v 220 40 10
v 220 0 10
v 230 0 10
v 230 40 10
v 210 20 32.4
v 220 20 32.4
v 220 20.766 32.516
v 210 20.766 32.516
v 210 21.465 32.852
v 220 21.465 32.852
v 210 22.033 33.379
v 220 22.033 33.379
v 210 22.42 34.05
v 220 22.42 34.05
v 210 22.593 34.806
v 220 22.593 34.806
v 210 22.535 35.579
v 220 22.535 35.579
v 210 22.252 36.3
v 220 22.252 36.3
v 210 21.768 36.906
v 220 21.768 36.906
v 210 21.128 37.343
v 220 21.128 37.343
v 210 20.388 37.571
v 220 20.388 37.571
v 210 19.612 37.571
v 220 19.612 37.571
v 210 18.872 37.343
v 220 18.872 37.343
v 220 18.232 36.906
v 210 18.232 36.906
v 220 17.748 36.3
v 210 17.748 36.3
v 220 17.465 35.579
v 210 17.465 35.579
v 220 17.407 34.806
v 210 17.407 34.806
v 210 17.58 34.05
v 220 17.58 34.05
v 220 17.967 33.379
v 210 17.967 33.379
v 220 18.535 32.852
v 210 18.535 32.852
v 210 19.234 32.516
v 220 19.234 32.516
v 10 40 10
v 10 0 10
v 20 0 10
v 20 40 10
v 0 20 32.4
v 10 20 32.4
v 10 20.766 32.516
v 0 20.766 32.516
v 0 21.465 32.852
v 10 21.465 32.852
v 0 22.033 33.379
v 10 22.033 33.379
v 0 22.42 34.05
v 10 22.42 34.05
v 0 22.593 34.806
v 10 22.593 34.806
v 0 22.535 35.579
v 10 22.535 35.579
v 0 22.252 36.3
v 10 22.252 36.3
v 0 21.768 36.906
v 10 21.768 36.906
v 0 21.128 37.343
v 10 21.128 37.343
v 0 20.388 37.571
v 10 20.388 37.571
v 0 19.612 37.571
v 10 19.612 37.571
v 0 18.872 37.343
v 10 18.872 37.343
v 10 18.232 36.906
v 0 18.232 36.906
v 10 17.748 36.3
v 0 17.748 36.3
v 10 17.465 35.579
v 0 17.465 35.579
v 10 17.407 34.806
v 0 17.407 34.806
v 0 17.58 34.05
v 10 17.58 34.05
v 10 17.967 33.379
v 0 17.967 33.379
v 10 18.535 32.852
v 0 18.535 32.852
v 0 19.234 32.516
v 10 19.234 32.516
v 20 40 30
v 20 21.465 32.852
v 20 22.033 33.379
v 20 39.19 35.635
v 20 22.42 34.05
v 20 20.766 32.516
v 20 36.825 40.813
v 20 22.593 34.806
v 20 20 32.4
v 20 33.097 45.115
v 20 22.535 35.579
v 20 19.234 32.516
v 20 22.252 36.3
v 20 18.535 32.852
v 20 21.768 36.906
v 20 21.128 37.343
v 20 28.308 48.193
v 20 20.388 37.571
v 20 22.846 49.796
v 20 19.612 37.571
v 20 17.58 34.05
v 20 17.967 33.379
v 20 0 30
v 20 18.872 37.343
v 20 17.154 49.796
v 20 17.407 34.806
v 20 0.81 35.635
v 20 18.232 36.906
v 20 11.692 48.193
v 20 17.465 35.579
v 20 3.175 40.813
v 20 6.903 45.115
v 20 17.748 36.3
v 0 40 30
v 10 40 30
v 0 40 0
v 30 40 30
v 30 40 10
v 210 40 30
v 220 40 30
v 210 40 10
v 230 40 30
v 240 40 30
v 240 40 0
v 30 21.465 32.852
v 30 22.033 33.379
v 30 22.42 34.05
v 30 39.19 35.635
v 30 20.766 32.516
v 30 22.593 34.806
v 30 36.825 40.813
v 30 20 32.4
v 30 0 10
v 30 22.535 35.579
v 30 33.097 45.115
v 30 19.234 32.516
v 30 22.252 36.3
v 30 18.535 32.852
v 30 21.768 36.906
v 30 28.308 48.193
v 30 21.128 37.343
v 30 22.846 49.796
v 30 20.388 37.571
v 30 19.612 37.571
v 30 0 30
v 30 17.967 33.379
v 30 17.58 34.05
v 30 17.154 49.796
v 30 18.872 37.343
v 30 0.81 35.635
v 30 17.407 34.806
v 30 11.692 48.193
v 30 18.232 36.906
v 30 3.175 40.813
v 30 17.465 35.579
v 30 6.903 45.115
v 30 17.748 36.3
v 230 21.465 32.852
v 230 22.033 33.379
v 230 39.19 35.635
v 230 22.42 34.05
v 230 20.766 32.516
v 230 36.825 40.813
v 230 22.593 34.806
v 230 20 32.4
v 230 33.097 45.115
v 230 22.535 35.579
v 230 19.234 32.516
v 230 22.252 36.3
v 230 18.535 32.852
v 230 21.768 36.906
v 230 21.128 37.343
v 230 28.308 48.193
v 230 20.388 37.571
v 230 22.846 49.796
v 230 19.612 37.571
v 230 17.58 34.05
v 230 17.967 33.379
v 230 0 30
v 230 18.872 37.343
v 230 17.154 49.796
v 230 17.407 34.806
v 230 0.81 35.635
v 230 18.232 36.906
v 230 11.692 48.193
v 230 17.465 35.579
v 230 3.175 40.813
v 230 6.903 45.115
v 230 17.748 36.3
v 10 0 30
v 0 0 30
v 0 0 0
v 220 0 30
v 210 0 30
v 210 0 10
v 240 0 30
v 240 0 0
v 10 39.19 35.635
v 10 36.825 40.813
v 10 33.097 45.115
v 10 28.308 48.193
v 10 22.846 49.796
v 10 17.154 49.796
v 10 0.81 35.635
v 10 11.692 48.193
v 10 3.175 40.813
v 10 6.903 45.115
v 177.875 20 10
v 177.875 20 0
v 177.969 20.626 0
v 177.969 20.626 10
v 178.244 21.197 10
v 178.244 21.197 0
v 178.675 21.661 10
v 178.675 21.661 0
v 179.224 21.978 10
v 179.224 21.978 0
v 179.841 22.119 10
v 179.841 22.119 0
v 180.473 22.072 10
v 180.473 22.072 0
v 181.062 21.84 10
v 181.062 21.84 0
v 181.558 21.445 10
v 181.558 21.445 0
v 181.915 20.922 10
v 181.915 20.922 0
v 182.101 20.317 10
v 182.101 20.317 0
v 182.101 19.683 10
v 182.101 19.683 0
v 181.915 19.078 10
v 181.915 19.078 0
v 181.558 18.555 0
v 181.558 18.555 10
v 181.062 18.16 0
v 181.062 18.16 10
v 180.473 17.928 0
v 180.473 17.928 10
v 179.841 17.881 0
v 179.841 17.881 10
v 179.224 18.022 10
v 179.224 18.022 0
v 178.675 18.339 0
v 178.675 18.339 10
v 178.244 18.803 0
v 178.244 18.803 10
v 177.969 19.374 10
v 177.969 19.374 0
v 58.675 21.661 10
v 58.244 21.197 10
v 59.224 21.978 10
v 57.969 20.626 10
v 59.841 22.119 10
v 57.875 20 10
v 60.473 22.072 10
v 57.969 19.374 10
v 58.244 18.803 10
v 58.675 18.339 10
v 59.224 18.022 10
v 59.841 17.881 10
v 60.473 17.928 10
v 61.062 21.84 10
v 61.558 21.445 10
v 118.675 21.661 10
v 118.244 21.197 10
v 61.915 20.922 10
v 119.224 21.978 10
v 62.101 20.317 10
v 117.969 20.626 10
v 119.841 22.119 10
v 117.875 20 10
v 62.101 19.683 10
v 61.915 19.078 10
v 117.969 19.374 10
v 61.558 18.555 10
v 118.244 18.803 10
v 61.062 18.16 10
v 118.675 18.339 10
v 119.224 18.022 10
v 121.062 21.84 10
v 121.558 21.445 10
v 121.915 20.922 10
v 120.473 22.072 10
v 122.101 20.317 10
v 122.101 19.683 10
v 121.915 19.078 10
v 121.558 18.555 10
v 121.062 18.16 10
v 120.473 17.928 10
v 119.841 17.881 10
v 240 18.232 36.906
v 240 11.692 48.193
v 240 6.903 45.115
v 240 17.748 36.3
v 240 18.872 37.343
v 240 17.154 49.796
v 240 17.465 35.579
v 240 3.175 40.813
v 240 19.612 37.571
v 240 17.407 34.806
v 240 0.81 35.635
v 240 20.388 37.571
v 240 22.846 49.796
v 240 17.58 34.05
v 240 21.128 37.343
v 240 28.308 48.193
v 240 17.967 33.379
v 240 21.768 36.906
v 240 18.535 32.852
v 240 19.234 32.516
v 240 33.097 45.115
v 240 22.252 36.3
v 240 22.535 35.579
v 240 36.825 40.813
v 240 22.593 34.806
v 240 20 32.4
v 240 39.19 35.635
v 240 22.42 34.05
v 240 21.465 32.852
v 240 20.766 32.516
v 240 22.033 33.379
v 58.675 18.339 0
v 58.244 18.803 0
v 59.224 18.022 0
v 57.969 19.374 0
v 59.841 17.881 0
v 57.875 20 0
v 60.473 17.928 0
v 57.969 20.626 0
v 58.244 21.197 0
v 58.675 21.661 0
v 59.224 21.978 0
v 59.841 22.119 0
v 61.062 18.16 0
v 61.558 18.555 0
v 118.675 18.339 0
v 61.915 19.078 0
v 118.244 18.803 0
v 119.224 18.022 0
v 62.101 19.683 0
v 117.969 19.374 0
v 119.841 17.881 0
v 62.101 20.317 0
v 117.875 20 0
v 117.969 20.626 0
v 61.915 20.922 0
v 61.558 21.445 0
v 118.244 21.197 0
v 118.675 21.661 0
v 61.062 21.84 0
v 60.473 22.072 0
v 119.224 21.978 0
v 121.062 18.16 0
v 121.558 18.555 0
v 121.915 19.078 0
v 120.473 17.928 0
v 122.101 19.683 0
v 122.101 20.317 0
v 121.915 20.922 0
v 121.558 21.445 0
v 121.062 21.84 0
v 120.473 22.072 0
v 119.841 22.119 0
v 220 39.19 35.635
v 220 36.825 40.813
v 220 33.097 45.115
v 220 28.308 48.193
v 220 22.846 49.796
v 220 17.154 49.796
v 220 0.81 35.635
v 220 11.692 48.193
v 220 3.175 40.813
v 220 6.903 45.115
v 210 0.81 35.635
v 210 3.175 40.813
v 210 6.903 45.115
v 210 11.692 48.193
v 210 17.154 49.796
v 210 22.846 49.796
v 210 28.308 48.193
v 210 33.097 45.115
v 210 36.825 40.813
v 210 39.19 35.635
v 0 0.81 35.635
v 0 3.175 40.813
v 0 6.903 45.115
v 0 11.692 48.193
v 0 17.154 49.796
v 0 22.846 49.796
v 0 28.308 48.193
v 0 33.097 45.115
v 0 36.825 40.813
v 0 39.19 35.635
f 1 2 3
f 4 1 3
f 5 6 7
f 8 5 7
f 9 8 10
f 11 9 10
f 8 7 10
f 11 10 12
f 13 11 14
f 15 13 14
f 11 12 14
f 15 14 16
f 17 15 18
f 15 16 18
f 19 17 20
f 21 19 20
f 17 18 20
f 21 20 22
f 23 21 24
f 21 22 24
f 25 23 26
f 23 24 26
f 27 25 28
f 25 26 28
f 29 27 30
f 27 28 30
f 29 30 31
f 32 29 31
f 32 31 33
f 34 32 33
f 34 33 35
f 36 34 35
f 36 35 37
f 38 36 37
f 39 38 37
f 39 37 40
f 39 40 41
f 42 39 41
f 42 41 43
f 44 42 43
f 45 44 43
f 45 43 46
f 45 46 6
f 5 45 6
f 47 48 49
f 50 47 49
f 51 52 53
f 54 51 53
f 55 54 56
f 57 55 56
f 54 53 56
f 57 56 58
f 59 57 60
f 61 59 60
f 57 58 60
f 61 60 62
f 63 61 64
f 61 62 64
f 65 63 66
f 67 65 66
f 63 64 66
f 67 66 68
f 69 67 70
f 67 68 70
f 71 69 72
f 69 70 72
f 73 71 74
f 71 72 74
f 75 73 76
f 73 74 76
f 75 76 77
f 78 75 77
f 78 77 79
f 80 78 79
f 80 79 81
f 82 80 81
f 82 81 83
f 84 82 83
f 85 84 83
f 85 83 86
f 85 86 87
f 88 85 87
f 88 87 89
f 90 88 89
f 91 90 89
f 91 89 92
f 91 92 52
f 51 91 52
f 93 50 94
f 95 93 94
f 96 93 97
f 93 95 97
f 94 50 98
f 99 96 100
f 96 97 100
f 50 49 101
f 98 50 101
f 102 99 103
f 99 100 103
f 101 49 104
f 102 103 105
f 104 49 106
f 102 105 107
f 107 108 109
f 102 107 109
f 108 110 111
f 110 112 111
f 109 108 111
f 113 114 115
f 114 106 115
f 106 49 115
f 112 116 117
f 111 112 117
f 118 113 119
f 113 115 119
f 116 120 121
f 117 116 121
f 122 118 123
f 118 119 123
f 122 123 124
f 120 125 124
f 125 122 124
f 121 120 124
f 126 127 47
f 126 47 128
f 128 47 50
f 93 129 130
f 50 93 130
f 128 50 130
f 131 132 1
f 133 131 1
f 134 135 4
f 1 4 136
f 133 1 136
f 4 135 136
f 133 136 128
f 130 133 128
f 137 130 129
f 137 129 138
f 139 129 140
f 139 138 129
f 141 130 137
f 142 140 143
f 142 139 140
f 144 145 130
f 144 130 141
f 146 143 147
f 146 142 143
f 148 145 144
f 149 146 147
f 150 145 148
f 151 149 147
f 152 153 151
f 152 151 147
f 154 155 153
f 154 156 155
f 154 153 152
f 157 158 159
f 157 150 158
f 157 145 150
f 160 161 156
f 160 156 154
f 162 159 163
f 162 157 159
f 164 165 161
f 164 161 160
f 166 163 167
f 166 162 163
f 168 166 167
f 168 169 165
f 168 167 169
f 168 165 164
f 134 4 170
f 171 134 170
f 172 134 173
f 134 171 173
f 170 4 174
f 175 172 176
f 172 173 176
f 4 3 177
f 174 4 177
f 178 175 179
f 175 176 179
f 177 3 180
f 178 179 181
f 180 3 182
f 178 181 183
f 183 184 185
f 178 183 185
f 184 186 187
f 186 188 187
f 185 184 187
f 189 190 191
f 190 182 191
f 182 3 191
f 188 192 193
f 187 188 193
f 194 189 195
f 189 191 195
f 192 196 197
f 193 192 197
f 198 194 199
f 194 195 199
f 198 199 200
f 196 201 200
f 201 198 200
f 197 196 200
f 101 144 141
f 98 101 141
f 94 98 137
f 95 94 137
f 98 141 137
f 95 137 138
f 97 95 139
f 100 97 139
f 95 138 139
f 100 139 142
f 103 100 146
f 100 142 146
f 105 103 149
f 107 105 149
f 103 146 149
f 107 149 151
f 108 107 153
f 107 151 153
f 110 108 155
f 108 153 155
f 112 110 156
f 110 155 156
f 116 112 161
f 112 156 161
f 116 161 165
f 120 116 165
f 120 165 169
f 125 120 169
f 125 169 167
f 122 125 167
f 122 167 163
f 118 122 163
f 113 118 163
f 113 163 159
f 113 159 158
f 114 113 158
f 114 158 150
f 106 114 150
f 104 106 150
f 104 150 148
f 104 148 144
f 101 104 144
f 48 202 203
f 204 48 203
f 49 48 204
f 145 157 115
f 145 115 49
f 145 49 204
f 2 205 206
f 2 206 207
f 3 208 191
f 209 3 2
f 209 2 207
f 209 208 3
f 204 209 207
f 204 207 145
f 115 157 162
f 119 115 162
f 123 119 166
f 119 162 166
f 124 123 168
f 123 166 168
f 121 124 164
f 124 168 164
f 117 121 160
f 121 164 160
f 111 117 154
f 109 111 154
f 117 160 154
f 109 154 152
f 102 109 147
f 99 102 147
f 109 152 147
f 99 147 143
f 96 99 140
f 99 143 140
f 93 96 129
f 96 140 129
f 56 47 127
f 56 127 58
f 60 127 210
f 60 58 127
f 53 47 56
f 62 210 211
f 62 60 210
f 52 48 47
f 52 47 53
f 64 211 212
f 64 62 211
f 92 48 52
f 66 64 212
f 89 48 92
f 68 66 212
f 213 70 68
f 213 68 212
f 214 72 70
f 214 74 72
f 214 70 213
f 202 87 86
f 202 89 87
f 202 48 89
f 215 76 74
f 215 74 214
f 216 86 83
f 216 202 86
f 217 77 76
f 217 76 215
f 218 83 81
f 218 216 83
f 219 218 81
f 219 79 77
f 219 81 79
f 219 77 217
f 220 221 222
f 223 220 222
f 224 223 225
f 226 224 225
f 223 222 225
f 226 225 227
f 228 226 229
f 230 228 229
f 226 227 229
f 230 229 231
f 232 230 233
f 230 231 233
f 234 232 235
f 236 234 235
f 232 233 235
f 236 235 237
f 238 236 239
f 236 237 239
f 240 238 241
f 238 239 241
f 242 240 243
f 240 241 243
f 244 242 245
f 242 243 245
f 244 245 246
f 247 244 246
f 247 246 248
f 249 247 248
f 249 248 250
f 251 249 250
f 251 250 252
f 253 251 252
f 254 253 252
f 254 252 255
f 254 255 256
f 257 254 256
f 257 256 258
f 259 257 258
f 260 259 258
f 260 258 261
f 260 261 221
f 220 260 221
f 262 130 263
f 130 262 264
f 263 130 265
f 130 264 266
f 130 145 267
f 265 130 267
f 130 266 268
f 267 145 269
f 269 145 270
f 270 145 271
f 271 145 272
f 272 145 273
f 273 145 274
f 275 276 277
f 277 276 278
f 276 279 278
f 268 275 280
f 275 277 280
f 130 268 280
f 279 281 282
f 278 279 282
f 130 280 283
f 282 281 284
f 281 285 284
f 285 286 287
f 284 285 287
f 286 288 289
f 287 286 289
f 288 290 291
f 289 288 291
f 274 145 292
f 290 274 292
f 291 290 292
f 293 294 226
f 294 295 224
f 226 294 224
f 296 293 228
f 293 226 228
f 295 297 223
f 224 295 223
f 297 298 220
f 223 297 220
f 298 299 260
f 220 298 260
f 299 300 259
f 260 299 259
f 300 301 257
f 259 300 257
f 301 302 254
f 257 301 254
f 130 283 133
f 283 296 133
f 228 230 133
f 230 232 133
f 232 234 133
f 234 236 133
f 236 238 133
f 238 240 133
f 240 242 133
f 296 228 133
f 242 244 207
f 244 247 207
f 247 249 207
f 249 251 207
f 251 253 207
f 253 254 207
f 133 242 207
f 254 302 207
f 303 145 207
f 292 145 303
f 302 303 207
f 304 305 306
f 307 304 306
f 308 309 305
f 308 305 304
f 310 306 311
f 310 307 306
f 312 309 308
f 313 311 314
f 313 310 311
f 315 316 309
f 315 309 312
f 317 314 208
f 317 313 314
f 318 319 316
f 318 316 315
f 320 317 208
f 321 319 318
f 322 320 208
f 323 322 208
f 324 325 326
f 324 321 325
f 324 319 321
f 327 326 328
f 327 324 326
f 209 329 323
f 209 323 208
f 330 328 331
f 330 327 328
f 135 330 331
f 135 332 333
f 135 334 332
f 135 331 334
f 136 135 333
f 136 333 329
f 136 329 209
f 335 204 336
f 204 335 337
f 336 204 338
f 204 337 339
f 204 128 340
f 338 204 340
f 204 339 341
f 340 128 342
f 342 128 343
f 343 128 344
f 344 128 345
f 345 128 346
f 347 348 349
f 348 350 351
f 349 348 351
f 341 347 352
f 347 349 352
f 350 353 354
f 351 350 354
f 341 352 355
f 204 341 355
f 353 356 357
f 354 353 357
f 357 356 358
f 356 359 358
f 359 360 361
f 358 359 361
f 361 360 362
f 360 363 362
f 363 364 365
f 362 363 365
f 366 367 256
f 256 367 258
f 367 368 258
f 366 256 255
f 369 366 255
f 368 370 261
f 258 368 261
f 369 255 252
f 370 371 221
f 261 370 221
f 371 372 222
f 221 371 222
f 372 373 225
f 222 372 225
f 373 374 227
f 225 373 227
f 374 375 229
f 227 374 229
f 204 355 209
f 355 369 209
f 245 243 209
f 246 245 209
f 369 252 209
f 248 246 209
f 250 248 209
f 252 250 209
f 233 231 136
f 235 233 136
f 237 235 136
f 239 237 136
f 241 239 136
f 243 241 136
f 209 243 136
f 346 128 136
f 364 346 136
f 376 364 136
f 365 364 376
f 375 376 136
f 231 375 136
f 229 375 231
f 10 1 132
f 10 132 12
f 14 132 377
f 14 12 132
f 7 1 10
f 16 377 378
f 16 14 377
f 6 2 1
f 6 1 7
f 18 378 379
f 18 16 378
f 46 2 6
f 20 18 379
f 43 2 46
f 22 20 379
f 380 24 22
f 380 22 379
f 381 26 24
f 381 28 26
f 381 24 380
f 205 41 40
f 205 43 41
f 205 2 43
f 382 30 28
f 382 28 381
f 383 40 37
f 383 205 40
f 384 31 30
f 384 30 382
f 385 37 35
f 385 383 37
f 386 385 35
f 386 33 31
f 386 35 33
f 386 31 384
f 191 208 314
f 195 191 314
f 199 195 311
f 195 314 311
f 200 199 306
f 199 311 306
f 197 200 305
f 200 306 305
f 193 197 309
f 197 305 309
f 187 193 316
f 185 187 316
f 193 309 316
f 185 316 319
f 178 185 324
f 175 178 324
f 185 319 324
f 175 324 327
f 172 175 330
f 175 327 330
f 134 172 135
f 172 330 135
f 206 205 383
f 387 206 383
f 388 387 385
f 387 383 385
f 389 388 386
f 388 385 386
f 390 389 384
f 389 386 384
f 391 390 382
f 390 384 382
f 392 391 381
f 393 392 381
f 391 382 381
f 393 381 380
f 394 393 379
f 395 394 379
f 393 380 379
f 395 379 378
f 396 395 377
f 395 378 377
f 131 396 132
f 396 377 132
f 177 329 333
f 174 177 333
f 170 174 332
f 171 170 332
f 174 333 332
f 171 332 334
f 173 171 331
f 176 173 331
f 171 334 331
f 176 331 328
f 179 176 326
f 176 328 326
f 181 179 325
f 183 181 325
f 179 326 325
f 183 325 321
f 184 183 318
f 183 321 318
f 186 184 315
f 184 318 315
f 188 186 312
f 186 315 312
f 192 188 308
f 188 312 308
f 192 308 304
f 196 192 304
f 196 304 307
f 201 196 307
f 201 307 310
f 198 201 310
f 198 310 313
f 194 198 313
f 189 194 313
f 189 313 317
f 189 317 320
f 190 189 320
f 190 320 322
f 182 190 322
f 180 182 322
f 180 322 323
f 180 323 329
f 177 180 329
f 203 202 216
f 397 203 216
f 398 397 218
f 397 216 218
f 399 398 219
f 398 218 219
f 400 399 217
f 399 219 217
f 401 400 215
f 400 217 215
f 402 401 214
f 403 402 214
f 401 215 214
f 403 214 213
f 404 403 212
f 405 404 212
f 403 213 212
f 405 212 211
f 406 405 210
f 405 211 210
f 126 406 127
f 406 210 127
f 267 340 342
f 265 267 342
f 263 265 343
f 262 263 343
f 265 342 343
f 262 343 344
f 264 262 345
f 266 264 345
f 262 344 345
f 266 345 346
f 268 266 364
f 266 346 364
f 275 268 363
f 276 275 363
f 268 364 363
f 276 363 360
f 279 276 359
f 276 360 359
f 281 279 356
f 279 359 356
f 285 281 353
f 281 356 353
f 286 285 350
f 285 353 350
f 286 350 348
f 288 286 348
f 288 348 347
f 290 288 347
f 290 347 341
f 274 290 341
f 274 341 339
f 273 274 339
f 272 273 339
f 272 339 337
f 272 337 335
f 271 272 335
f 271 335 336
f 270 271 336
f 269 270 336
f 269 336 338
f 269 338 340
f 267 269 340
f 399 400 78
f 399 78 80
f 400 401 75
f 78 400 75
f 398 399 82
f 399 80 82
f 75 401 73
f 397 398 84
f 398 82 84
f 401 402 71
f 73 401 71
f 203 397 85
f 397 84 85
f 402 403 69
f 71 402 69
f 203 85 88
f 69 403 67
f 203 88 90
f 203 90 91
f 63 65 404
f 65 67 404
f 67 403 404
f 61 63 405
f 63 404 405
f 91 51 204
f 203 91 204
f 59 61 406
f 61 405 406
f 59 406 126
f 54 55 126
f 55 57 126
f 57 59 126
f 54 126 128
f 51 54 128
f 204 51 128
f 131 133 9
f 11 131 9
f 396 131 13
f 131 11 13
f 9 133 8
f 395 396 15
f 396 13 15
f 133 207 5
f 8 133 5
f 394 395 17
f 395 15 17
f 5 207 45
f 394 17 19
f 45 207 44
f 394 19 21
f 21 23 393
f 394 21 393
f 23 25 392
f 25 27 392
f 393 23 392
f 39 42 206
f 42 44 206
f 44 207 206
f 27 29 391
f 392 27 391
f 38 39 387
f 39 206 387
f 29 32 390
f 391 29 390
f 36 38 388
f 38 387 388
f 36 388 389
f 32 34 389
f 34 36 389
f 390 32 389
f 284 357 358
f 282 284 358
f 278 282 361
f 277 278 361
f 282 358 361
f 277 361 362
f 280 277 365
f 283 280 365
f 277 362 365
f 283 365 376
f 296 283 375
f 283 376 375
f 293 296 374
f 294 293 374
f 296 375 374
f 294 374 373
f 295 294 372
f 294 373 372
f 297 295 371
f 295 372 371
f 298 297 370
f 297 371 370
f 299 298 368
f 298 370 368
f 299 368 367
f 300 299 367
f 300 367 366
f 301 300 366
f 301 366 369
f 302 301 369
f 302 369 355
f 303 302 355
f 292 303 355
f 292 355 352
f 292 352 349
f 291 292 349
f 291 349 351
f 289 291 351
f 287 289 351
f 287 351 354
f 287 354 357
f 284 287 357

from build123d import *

# Parameters (mm, degrees)
SKETCH1_W           = 240
SKETCH1_H           = 40
BOSS_EXTRUDE1_DEPTH = 10
SKETCH2_W           = 20
SKETCH2_H           = 40
BOSS_EXTRUDE2_DEPTH = 240
SKETCH3_R           = 2.6
CUT_EXTRUDE1_DEPTH  = 300
SKETCH4_W           = 10
SKETCH4_H           = 40
SKETCH4_W_2         = 180
CUT_EXTRUDE2_DEPTH  = 300
SKETCH5_R           = 2.125
CUT_EXTRUDE3_DEPTH  = 300


with BuildPart() as part:
    # Sketch1 → Boss-Extrude1 (new body)
    with BuildSketch(Plane.XY):
        with Locations((120, 20)):
            Rectangle(SKETCH1_W, SKETCH1_H)
    extrude(amount=BOSS_EXTRUDE1_DEPTH)

    # Sketch2 → Boss-Extrude2 (add)
    with BuildSketch(Plane(origin=(240, 0, 0), x_dir=(0, 0, -1), z_dir=(1, 0, 0))):
        with Locations((-20, 20)):
            Rectangle(SKETCH2_W, SKETCH2_H)
        with BuildLine():
            Line((-30, 40), (-30, 0))
            ThreePointArc((-30, 0), (-50, 20), (-30, 40))
        make_face()
    extrude(amount=-BOSS_EXTRUDE2_DEPTH)

    # Sketch3 → Cut-Extrude1 (cut)
    with BuildSketch(Plane(origin=(240, 0, 0), x_dir=(0, 0, -1), z_dir=(1, 0, 0))):
        with Locations((-35, 20)):
            Circle(SKETCH3_R)
    extrude(amount=-CUT_EXTRUDE1_DEPTH, mode=Mode.SUBTRACT)

    # Sketch4 → Cut-Extrude2 (cut)
    with BuildSketch(Plane.XZ):
        with Locations((15, 30)):
            Rectangle(SKETCH4_W, SKETCH4_H)
        with Locations((120, 30)):
            Rectangle(SKETCH4_W_2, SKETCH4_H)
        with Locations((225, 30)):
            Rectangle(SKETCH4_W, SKETCH4_H)
    extrude(amount=-CUT_EXTRUDE2_DEPTH, mode=Mode.SUBTRACT)

    # Sketch5 → Cut-Extrude3 (cut)
    with BuildSketch(Plane(origin=(0, 0, 0), x_dir=(-1, 0, 0), z_dir=(0, 0, -1))):
        with Locations((-180, 20)):
            Circle(SKETCH5_R)
        with Locations((-120, 20)):
            Circle(SKETCH5_R)
        with Locations((-60, 20)):
            Circle(SKETCH5_R)
    extrude(amount=-CUT_EXTRUDE3_DEPTH, mode=Mode.SUBTRACT)


solid = part.part
